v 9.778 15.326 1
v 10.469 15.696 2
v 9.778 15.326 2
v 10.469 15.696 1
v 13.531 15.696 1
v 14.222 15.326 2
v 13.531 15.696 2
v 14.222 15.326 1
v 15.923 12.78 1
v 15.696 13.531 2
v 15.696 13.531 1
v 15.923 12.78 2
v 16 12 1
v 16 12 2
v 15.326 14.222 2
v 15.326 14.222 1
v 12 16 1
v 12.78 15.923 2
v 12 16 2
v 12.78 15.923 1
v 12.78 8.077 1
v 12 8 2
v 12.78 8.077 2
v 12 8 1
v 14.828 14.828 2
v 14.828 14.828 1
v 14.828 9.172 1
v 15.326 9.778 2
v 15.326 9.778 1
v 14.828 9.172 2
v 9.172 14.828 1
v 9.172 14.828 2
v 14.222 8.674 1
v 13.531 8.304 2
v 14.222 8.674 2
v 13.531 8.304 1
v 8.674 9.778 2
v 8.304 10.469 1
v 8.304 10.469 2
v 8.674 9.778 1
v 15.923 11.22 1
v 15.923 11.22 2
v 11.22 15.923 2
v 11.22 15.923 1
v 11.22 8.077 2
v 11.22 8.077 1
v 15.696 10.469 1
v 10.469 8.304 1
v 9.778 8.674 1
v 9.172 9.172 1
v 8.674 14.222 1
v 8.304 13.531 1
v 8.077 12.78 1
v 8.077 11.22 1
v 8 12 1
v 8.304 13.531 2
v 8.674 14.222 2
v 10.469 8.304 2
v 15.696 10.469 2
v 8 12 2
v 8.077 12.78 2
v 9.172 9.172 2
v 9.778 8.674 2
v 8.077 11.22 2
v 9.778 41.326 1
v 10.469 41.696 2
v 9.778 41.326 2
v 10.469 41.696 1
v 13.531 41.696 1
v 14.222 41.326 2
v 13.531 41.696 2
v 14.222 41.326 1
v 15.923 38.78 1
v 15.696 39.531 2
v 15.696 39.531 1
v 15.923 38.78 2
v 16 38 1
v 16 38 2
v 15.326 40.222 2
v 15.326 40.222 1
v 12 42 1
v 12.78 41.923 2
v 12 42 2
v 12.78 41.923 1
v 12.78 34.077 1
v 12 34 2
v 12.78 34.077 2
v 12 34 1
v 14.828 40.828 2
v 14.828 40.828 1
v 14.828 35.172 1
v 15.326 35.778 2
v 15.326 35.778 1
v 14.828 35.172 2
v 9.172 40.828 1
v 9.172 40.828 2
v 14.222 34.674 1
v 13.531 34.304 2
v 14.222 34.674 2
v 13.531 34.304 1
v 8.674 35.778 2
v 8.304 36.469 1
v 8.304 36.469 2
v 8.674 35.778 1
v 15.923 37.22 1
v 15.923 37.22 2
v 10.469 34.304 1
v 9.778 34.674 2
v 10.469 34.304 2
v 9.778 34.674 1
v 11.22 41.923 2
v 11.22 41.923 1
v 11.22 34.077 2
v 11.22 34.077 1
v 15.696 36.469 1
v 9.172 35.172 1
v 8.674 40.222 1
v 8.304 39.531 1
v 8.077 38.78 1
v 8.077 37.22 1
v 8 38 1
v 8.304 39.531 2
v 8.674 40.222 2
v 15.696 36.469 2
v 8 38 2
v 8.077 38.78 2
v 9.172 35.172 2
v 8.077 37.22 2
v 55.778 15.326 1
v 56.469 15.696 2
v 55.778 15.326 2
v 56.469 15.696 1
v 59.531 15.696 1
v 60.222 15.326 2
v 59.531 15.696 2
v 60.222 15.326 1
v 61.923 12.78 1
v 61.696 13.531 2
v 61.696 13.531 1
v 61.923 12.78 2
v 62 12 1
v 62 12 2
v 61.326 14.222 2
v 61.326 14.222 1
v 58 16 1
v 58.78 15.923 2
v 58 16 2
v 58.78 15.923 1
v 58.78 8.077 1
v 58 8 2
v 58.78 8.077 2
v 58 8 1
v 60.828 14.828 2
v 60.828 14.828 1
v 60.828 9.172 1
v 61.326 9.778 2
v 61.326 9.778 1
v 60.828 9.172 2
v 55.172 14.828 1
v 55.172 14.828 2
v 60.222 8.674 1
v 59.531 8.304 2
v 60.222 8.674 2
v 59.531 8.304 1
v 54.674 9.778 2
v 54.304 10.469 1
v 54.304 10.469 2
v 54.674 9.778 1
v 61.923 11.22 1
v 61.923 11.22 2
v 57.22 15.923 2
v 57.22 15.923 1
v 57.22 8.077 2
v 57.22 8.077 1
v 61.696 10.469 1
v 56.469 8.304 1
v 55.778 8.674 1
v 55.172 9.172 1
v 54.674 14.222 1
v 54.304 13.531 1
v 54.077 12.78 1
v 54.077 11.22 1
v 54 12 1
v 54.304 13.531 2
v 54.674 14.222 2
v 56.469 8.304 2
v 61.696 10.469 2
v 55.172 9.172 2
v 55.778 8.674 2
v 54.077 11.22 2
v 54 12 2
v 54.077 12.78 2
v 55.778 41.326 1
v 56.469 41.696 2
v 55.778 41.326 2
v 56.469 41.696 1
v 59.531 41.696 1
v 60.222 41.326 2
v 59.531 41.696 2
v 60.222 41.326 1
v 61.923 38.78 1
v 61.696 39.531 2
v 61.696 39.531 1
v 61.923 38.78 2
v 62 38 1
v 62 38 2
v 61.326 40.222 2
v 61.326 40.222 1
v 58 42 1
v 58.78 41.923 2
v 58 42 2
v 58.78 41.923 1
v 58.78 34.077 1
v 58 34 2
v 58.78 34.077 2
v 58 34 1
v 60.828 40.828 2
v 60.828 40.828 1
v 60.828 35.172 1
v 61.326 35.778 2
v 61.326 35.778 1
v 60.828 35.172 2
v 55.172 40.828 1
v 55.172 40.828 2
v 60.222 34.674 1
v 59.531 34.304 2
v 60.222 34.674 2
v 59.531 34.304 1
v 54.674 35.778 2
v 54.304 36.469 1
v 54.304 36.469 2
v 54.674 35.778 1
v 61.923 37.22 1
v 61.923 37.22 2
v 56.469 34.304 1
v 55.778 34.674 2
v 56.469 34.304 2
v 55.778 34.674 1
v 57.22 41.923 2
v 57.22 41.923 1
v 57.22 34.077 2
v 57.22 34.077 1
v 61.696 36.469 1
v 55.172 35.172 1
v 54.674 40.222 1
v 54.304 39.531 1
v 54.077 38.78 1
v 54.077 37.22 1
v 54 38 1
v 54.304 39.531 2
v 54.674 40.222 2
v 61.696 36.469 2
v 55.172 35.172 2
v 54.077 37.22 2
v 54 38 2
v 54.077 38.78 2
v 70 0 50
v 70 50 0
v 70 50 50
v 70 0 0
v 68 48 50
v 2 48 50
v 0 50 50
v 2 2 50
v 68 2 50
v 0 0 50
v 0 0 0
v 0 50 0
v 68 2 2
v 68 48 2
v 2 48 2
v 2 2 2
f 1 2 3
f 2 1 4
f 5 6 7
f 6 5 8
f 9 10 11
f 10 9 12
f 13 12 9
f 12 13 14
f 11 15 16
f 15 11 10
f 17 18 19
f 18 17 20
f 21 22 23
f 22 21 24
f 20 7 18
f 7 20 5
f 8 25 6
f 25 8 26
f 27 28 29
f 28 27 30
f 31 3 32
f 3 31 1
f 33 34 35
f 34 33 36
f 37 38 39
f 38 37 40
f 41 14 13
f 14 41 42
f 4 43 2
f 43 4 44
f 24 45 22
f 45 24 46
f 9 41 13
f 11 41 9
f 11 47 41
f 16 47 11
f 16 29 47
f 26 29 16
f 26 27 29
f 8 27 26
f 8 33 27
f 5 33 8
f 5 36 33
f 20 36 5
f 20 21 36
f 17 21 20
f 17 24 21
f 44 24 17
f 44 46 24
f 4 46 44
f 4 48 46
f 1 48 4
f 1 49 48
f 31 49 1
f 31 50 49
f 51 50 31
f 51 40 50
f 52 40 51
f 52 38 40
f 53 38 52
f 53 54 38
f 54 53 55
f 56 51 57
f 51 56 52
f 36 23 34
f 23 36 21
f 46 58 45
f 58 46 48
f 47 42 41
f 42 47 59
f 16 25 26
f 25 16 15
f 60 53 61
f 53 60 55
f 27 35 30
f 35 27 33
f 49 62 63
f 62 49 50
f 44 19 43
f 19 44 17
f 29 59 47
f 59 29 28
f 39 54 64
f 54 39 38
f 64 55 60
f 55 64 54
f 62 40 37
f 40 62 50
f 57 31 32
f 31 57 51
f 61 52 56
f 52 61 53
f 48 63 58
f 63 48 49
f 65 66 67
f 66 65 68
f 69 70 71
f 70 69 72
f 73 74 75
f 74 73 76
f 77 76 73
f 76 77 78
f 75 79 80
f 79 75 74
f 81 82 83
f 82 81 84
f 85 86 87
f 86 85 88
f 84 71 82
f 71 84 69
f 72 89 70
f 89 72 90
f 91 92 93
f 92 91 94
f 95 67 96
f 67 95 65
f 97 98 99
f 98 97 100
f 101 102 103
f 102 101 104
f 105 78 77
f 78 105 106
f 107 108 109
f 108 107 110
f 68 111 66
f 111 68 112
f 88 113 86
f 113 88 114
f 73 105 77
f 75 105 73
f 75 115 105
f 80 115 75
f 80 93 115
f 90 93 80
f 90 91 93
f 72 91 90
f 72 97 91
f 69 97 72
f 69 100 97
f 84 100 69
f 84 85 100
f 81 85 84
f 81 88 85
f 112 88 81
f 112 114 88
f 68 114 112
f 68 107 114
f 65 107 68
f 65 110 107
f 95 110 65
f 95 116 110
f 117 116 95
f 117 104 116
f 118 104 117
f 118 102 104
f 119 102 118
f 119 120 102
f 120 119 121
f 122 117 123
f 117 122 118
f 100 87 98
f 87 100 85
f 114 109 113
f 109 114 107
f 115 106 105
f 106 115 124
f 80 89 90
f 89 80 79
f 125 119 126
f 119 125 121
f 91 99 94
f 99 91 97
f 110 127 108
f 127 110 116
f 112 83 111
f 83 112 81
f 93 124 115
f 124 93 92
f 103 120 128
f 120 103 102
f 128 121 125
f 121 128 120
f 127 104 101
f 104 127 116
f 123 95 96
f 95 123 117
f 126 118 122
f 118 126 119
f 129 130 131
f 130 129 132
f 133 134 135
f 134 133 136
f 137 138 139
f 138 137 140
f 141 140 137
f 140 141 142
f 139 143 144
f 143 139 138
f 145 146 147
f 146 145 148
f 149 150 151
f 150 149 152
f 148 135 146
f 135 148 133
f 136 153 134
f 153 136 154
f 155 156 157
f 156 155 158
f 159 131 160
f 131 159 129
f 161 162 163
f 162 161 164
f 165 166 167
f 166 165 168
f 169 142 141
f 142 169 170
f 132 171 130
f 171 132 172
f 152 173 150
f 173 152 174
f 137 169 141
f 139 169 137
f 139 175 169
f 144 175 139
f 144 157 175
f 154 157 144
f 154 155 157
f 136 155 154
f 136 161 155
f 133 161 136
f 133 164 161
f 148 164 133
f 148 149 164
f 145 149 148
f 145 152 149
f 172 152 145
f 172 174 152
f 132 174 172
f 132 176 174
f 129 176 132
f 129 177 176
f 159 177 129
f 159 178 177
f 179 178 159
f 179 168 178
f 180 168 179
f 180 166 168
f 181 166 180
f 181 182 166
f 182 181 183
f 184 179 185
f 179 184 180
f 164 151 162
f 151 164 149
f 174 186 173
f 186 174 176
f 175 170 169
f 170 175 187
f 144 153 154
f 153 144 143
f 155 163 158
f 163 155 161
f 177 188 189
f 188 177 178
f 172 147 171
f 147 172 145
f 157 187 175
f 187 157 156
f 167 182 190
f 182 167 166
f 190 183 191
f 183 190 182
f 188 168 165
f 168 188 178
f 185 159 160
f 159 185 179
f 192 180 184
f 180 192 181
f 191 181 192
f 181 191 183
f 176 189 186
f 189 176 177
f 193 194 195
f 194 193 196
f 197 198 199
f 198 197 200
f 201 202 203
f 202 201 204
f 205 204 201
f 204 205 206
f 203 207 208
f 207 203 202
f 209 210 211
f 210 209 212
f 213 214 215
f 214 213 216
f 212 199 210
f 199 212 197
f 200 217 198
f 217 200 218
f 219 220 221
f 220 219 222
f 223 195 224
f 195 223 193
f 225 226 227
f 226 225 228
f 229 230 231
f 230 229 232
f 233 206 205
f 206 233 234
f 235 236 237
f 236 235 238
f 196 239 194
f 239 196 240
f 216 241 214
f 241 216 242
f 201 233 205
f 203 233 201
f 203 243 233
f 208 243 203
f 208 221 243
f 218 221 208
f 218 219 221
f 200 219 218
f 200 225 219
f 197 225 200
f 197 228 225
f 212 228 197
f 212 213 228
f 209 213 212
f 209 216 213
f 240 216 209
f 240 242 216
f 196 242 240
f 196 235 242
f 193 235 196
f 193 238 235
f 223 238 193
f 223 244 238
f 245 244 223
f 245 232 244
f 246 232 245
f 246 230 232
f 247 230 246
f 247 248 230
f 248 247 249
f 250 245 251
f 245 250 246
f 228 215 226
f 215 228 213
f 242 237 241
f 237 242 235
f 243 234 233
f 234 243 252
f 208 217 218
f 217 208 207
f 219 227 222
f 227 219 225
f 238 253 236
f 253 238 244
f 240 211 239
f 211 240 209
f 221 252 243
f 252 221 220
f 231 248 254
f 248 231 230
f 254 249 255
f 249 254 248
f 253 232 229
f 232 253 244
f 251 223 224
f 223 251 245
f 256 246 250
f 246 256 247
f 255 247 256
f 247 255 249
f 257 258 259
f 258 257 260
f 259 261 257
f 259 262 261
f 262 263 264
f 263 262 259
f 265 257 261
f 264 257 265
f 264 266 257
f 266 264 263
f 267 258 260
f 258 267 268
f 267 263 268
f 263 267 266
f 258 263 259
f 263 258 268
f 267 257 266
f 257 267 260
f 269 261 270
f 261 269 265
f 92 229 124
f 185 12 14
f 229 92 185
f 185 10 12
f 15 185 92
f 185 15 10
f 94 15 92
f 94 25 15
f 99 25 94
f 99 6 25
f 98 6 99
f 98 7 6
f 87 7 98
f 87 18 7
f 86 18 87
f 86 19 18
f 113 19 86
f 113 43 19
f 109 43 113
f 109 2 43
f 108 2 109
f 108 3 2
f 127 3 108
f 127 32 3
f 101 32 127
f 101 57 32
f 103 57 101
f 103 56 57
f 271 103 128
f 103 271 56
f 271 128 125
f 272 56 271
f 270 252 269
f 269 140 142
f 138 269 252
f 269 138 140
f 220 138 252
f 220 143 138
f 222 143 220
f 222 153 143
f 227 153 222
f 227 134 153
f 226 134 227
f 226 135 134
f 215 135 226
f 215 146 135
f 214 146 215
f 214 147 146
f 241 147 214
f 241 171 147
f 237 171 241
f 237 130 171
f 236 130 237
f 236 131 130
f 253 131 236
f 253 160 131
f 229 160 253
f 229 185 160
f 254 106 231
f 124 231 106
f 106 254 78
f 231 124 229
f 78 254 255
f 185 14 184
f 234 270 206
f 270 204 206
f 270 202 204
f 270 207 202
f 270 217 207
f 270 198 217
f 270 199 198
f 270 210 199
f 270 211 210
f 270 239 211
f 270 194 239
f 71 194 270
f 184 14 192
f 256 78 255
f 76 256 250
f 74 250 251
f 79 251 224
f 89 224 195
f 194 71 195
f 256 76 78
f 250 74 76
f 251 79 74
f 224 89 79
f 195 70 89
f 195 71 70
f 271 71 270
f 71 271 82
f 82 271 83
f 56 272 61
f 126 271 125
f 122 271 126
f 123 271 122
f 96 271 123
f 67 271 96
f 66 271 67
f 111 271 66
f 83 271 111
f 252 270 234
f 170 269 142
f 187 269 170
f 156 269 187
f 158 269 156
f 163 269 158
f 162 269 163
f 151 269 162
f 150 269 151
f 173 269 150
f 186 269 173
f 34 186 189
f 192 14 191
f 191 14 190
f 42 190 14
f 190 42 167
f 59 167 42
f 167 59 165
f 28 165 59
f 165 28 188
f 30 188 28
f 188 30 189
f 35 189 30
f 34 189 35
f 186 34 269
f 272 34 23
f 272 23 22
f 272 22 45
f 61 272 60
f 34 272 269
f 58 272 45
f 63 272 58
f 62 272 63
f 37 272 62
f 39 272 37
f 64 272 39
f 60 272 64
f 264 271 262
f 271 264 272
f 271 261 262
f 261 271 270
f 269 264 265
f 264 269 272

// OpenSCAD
$fn = 32;

// ----------------------------------------------------------------------
// Enclosure box: bosses enclosure
// ----------------------------------------------------------------------

// --- parameters (mm) ---
box_l = 70;               // outer length, X
box_w = 50;               // outer width, Y
box_h = 50;               // outer height
wall_t = 2;               // wall thickness
boss_r = 4;               // corner boss radius
hole_r = 2;               // boss screw hole radius
boss_in = 12;             // boss inset from the corners

inner_h = box_h - wall_t;  // cavity depth
boss_h = inner_h - 2;  // corner boss height

difference() {
  cube([box_l, box_w, box_h]);
  translate([wall_t, wall_t, wall_t])
    cube([box_l - 2 * wall_t, box_w - 2 * wall_t, box_h]);
  for (sx = [0, 1], sy = [0, 1])
    translate([sx ? box_l - boss_in : boss_in,
               sy ? box_w - boss_in : boss_in, wall_t - 1]) {
      cylinder(r = boss_r, h = boss_h);
      translate([0, 0, boss_h - 4])
        cylinder(r = hole_r, h = 5);
    }
}
